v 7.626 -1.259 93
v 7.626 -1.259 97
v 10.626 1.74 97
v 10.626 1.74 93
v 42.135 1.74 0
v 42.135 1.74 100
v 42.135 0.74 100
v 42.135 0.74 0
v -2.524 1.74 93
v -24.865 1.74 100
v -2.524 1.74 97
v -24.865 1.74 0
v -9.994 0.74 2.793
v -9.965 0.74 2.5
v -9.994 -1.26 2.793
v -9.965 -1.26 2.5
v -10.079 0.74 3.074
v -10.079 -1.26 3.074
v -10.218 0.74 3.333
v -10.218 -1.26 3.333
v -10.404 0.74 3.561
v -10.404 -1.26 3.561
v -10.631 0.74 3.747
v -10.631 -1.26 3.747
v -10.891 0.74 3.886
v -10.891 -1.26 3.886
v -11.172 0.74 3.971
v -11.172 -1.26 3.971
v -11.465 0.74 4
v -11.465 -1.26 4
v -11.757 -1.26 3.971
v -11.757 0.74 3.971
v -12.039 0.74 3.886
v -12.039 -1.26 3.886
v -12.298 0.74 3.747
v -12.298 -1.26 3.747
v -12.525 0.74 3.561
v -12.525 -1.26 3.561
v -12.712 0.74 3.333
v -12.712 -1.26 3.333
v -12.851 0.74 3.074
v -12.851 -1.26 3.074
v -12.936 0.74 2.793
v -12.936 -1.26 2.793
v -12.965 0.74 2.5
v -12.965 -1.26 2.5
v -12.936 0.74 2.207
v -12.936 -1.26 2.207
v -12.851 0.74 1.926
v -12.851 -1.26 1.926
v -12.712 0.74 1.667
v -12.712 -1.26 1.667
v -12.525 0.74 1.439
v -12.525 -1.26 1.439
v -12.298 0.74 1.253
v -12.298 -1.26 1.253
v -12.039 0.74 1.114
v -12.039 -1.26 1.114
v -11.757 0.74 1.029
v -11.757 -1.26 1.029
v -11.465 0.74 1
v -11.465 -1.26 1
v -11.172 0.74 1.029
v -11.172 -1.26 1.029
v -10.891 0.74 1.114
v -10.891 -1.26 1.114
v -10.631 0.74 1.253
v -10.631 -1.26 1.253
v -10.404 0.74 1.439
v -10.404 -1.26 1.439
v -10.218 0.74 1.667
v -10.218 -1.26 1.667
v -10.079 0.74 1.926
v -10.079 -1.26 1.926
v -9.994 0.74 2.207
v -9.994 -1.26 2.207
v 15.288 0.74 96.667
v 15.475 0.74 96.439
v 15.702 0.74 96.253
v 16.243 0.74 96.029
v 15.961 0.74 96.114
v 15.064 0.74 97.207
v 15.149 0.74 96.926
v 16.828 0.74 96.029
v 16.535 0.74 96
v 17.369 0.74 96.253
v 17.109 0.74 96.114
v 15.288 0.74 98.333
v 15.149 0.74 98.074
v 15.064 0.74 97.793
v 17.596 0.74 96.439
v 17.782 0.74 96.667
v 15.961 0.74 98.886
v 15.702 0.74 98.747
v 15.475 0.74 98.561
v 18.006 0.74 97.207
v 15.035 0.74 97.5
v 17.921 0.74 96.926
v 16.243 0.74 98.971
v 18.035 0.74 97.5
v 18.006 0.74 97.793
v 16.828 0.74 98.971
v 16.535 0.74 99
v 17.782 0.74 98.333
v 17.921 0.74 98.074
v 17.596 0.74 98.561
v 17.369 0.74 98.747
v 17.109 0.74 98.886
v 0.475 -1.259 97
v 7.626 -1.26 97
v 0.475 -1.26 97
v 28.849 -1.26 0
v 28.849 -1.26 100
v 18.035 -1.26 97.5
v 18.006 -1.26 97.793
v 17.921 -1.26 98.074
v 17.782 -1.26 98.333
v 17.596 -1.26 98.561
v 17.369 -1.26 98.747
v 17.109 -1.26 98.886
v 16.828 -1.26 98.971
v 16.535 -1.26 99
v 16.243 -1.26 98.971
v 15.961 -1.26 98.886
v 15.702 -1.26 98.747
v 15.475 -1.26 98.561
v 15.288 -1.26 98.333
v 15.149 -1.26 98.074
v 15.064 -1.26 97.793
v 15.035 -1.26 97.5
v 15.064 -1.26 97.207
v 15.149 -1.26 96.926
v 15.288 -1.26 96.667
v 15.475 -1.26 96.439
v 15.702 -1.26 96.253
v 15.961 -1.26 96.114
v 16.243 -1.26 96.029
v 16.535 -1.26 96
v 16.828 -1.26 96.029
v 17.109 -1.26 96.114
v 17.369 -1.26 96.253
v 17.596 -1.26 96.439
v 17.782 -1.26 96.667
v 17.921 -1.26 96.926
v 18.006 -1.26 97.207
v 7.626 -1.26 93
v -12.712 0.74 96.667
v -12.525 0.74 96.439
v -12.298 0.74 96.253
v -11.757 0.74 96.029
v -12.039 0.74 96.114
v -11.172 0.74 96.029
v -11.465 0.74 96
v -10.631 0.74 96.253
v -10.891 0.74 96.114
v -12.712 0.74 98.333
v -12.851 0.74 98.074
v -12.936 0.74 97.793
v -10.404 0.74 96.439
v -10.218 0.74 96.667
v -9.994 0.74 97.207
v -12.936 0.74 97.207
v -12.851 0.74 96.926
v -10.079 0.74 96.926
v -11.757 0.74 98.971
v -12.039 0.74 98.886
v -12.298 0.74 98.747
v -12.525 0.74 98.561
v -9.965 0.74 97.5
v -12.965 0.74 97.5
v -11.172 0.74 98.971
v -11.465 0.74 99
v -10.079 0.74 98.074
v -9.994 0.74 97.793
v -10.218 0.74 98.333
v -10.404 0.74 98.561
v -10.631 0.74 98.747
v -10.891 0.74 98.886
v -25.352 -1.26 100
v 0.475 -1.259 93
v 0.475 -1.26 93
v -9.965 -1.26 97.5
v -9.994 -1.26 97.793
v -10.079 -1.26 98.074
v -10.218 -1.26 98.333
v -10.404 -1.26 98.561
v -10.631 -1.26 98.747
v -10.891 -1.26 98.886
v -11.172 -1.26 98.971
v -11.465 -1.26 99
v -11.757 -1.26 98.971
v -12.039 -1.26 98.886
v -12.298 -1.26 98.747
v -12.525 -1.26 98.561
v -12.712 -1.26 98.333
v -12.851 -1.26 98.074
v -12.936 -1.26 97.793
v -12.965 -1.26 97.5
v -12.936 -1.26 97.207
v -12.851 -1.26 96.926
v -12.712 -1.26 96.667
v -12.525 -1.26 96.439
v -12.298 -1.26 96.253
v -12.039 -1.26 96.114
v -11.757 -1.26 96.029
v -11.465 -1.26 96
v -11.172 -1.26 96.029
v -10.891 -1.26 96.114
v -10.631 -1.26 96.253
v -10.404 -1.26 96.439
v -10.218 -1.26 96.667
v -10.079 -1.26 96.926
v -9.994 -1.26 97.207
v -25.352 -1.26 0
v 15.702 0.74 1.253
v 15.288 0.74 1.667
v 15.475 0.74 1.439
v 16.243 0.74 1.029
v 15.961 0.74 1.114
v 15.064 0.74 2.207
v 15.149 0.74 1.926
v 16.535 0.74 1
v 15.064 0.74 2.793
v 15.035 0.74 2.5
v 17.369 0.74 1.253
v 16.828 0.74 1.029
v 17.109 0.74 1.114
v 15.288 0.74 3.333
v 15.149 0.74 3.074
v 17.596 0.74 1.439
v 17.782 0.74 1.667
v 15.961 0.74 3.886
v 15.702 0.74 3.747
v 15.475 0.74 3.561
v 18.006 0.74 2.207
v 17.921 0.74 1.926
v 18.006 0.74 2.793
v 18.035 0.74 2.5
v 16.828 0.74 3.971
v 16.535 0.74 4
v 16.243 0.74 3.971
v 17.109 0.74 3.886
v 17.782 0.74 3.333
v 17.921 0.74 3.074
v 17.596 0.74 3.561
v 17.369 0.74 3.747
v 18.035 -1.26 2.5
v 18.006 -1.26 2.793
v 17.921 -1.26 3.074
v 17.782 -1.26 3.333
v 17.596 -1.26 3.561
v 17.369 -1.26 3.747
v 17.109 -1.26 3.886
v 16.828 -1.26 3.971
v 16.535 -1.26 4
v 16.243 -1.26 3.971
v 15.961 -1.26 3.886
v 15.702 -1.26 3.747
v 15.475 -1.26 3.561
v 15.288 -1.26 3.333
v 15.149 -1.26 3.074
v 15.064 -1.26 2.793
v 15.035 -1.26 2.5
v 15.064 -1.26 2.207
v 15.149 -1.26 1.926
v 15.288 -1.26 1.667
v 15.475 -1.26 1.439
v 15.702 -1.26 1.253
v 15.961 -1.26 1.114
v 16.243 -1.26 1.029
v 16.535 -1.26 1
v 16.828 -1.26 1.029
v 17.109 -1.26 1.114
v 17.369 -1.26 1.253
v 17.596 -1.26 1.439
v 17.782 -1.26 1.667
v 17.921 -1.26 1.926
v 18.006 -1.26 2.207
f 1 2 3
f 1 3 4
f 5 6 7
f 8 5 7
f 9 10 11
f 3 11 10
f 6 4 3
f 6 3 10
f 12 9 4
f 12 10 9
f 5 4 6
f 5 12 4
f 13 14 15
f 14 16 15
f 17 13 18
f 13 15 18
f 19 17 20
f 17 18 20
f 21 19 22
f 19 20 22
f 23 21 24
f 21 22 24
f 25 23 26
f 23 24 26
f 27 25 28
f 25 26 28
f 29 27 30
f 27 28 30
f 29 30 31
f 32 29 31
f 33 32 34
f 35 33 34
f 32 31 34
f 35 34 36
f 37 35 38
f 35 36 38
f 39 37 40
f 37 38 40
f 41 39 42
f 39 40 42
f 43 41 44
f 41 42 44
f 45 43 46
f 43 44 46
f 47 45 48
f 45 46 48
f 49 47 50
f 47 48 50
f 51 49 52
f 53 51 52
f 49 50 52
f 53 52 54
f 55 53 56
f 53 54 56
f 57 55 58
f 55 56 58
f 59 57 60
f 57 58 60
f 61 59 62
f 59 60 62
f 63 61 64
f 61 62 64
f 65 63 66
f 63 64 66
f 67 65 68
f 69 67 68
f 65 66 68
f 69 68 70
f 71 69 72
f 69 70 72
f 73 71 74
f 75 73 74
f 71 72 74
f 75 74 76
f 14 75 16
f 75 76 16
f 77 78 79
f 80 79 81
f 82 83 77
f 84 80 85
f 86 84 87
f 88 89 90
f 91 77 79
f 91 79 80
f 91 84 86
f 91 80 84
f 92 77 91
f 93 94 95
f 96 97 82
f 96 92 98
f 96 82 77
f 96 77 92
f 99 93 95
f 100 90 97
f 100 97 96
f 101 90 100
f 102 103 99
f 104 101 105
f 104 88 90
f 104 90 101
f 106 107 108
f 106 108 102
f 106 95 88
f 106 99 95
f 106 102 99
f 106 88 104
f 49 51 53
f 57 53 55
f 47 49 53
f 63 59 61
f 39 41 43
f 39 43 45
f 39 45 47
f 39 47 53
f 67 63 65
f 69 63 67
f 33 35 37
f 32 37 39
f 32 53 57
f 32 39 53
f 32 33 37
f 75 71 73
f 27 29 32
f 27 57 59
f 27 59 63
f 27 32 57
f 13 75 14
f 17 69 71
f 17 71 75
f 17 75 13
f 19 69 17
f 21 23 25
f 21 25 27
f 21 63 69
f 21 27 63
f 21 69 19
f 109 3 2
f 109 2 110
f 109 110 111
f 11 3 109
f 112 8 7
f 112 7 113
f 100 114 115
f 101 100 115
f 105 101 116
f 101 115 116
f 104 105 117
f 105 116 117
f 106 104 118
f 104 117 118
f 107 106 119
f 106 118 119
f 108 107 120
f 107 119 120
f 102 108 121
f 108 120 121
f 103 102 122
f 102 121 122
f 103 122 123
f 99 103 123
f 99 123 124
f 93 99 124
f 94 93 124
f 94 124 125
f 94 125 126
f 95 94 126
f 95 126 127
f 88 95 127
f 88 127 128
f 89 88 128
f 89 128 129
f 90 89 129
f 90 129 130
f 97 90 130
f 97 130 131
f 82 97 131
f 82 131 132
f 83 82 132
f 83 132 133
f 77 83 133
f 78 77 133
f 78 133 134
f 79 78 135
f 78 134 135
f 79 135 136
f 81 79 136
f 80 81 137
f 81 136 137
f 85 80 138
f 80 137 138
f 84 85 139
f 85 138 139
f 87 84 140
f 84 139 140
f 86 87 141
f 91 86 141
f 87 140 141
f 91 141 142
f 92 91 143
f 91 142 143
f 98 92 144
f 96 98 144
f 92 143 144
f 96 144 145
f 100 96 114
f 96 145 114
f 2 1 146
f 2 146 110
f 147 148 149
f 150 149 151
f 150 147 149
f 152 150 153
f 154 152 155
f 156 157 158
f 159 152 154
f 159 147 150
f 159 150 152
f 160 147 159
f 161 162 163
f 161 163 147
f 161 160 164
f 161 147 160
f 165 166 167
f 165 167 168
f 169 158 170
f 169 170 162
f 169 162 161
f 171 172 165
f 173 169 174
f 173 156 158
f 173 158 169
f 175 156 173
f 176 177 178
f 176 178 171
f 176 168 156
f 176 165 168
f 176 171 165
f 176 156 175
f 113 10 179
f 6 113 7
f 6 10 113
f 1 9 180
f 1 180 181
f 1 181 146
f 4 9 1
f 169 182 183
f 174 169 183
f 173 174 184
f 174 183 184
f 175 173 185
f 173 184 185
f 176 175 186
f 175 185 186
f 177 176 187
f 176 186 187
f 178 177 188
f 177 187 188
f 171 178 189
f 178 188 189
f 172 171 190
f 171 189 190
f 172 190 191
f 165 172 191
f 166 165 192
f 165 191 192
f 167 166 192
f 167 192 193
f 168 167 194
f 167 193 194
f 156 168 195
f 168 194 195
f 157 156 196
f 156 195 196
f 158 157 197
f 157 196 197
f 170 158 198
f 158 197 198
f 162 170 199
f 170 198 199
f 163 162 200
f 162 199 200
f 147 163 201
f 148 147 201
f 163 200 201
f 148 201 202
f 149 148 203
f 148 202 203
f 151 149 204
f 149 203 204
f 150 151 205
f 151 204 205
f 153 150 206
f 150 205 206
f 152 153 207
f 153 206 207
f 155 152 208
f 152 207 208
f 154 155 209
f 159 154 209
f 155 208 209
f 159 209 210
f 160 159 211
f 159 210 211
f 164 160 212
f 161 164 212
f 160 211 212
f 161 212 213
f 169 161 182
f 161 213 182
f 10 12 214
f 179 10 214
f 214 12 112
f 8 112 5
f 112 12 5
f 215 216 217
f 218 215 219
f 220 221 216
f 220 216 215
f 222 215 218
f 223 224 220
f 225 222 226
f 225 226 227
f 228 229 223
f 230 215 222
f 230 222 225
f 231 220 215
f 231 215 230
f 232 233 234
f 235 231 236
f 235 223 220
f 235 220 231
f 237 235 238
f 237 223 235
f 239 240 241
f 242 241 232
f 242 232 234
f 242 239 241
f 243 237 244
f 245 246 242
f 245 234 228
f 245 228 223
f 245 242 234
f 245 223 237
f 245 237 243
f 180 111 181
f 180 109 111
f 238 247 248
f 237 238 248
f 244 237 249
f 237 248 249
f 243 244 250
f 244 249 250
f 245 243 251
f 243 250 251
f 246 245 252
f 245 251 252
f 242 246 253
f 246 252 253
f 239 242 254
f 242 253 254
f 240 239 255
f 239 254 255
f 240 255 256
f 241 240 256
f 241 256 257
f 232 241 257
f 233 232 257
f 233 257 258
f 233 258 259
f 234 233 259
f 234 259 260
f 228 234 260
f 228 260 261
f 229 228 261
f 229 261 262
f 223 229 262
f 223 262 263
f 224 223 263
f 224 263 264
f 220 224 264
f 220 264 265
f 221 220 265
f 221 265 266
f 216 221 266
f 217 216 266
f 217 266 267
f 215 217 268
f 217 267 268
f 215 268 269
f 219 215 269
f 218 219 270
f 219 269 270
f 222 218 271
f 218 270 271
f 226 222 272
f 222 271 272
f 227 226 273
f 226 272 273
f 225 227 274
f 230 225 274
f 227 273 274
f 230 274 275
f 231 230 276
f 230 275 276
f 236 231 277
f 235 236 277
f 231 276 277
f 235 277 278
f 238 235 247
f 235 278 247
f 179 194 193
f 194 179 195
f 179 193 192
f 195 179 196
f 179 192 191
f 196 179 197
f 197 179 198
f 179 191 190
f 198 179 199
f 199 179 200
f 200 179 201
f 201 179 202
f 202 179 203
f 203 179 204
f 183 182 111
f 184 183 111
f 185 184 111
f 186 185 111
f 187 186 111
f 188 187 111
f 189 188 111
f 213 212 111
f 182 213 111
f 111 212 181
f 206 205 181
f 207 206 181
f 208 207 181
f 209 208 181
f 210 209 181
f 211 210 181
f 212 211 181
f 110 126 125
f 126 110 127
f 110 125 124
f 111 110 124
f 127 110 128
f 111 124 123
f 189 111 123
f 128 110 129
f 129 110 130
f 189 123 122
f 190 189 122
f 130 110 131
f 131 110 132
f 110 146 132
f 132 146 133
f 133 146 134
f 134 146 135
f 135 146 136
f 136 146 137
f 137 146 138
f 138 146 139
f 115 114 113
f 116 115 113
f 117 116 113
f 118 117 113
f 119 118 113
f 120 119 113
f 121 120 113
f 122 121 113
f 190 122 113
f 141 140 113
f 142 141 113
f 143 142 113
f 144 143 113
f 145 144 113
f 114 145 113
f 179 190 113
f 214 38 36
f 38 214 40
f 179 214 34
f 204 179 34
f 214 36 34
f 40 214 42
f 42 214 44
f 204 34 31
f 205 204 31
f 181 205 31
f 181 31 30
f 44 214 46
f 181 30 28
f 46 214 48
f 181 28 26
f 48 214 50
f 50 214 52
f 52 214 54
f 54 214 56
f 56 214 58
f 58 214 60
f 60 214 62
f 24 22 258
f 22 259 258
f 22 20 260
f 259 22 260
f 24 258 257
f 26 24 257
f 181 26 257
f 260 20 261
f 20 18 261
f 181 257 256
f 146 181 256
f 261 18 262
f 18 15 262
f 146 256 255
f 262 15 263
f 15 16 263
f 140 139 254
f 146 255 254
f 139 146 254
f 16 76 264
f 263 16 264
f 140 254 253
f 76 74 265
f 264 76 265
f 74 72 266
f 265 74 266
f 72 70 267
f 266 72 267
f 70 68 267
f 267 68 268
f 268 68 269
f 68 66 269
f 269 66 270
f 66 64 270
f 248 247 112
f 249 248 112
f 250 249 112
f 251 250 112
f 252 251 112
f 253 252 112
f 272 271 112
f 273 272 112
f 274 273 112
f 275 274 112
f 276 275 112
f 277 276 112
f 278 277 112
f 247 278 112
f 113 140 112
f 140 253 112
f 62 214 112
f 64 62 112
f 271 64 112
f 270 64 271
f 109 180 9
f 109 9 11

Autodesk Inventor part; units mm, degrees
ref_plane "YZ Plane" through (0, 0, 0) normal (1, 0, 0) x (0, 1, 0)
ref_plane "XZ Plane" through (0, 0, 0) normal (0, 1, 0) x (-1, 0, 0)
ref_plane "XY Plane" through (0, 0, 0) normal (0, 0, 1) x (1, 0, 0)
sketch "Sketch1" plane through (0, 0, 0) normal (0, 0, 1) x (1, 0, 0)
  line L0 (-24.865, 1.7403) -> (-25.3518, -1.2597)
  line L1 (-25.3518, -1.2597) -> (28.8493, -1.2597)
  line L2 (-24.865, 1.7403) -> (42.135, 1.7403)
  line L3 (42.135, 1.7403) -> (42.135, 0.7403)
  line L4 (42.135, 0.7403) -> (28.8493, -1.2597)
  point P0 (0, 0)
  dimension "d0" = 67
  dimension "d26" = 3
  dimension "d27" = 1
  dimension "d46" = 0.4868
  dimension "d48" = 13.2857
extrude "Extrusion1" add sketch "Sketch1" along normal blind 100
sketch "Sketch3" plane through (-24.865, 1.7403, 0) normal (0, 1, 0) x (1, 0, 0)
  line L0 (25.3402, -93) -> (32.491, -93)
  line L1 (32.491, -93) -> (32.491, -97)
  line L2 (32.491, -97) -> (25.3402, -97)
  line L3 (25.3402, -97) -> (25.3402, -93)
  line L4 (-0.4868, 0) -> (-0.4868, -100) projected
  point P0 (24.865, 0)
  point P1 (16.7856, -97)
  point P2 (23.8348, -93)
  dimension "d49" = 25.827
  dimension "d50" = 7.1508
extrude "Extrusion2" cut sketch "Sketch3" against normal through all
chamfer "Chamfer2" distance 3 angle 45 2 edges at (0.4752, 1.7403, 95) (7.626, 1.7403, 95) measured on face at (8.2987, 1.7403, 31)
sketch "Sketch4" plane through (-25.3518, -1.2597, 0) normal (0, -1, 0) x (1, 0, 0)
  circle A0 centre (13.887, 97.5) radius 1.5
  circle A1 centre (41.887, 97.5) radius 1.5
  circle A2 centre (13.887, 2.5) radius 1.5
  circle A3 centre (41.887, 2.5) radius 1.5
  line L0 (0, 100) -> (54.2011, 100) projected
  line L1 (0, 0) -> (54.2011, 0) projected
  line L2 (0, 0) -> (0, 100) projected
  point P0 (25.3518, 0)
  dimension "d28" = 3
  dimension "d29" = 3
  dimension "d30" = 3
  dimension "d31" = 3
  dimension "d32" = 2.5
  dimension "d33" = 2.5
  dimension "d34" = 2.5
  dimension "d35" = 2.5
  dimension "d36" = 13.887
  dimension "d37" = 28
  dimension "d38" = 13.887
  dimension "d39" = 28
extrude "Extrusion3" cut sketch "Sketch4" against normal blind 2
properties part number "porywa" material "Polycarbonate, Clear"
